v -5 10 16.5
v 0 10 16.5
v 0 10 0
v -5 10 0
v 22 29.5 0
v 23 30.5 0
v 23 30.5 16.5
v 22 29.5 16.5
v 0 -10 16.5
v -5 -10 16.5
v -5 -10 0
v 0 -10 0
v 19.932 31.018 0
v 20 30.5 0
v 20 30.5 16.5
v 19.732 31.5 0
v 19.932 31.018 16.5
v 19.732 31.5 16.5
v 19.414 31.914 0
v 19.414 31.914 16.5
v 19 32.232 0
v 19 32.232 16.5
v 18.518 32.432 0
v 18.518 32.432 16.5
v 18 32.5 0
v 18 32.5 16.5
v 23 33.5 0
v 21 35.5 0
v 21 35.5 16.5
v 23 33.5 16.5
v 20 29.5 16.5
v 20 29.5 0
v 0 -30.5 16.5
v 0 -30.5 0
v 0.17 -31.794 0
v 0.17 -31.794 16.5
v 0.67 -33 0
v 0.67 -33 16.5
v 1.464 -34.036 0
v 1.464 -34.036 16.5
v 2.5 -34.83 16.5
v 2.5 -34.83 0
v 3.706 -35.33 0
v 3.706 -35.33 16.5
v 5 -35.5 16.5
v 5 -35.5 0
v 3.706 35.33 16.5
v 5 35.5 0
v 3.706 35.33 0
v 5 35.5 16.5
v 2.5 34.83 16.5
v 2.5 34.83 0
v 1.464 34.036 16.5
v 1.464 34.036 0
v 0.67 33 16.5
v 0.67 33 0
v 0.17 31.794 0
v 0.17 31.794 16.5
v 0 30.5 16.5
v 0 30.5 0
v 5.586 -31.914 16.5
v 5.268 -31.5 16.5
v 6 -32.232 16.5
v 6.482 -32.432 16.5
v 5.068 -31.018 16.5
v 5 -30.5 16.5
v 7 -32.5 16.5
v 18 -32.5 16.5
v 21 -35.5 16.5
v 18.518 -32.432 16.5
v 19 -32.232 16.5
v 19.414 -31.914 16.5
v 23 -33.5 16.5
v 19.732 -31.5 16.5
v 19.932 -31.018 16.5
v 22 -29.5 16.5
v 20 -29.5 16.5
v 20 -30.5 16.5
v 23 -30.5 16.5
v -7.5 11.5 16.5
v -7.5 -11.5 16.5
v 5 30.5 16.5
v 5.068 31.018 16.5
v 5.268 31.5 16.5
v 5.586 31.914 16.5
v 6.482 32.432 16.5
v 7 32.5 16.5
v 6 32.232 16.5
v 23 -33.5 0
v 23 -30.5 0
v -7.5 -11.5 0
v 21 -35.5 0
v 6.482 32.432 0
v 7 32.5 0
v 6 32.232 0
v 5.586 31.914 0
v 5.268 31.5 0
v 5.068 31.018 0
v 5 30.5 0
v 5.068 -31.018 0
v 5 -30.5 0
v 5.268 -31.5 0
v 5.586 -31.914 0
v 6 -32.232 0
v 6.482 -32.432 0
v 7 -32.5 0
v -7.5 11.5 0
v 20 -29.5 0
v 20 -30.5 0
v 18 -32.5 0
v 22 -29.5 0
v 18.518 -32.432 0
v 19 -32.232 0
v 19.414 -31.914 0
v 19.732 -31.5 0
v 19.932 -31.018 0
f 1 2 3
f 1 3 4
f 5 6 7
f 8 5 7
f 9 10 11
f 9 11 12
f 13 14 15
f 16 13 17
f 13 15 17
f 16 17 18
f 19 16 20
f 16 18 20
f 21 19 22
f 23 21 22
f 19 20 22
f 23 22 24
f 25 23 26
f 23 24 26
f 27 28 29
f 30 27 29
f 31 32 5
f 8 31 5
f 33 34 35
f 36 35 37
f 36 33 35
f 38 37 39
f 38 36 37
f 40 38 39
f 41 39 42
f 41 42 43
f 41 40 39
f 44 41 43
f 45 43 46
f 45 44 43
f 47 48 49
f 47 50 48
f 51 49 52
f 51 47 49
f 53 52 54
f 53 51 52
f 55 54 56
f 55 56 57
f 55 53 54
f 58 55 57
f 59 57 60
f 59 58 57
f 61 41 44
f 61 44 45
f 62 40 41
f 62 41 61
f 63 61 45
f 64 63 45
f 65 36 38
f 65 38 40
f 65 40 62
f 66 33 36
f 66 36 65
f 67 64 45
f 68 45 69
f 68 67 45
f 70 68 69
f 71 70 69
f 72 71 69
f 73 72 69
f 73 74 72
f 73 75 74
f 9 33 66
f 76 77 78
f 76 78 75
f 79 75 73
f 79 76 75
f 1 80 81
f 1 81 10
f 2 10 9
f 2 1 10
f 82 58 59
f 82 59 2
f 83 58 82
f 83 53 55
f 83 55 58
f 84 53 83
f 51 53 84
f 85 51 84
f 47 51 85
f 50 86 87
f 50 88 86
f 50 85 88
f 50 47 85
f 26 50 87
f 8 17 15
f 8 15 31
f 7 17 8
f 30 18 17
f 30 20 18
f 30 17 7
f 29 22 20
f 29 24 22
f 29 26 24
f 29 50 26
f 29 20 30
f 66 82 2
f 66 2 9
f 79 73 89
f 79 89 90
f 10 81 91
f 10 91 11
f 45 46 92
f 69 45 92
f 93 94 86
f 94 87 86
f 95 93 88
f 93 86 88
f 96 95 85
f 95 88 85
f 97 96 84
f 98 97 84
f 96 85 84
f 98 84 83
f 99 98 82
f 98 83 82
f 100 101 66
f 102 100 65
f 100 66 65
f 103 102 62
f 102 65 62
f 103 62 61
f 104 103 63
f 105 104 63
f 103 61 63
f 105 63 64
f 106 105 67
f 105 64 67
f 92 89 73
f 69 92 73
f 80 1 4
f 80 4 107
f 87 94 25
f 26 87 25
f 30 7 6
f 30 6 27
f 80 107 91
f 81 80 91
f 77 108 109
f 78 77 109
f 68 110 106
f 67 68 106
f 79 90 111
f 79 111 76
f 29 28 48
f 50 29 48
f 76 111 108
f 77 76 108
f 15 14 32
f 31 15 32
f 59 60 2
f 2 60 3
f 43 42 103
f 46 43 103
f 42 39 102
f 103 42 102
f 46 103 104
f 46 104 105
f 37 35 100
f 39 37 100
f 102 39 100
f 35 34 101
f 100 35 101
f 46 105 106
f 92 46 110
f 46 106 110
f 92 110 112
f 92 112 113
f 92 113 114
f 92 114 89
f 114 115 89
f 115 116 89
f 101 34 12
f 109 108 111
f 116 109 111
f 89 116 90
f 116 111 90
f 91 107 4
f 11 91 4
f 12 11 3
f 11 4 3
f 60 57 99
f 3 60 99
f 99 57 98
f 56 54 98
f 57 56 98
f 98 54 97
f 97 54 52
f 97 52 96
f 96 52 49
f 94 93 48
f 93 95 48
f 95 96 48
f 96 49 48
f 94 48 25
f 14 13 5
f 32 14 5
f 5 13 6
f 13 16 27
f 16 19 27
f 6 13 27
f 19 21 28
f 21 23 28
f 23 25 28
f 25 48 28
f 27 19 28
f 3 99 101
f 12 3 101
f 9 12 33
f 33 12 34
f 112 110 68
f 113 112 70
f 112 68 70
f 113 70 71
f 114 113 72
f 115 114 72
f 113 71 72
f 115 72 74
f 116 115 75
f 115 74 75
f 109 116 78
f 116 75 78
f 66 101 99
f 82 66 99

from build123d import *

# Parameters (mm, degrees)
F1_DEPTH = 16.5
F2_R     = 5
F3_R     = 2
F4_SIZE  = 1
F5_SIZE  = 2
F7_DEPTH = 16.5


with BuildPart() as f1:
    # F0 (on Top) → F1 (new body)
    with BuildSketch(Plane.XY):
        Polygon((23, 35.5), (0, 35.5), (0, 10), (-5, 10), (-5, -10), (0, -10), (0, -35.5), (23, -35.5), (23, -29.5), (20, -29.5), (20, -32.5), (5, -32.5), (5, 32.5), (20, 32.5), (20, 29.5), (23, 29.5), align=None)
    extrude(amount=F1_DEPTH)

    # F2
    f2_edges = [f1.edges().sort_by_distance(p)[0] for p in [
        (0, -35.5, 8.25),
        (0, 35.5, 8.25),
    ]]
    fillet(f2_edges, radius=F2_R)

    # F3
    f3_edges = [f1.edges().sort_by_distance(p)[0] for p in [
        (5, 32.5, 8.25),
        (5, -32.5, 8.25),
        (20, 32.5, 8.25),
        (20, -32.5, 8.25),
    ]]
    fillet(f3_edges, radius=F3_R)

    # F4
    f4_edges = [f1.edges().sort_by_distance(p)[0] for p in [
        (23, 29.5, 8.25),
        (23, -29.5, 8.25),
    ]]
    chamfer(f4_edges, length=F4_SIZE)

    # F5
    f5_edges = [f1.edges().sort_by_distance(p)[0] for p in [
        (23, 35.5, 8.25),
        (23, -35.5, 8.25),
    ]]
    chamfer(f5_edges, length=F5_SIZE)

    # F6 (on Top) → F7 (join)
    with BuildSketch(Plane.XY):
        Polygon((-5, 10), (-7.5, 11.5), (-7.5, -11.5), (-5, -10), align=None)
    extrude(amount=F7_DEPTH)


solid = f1.part
